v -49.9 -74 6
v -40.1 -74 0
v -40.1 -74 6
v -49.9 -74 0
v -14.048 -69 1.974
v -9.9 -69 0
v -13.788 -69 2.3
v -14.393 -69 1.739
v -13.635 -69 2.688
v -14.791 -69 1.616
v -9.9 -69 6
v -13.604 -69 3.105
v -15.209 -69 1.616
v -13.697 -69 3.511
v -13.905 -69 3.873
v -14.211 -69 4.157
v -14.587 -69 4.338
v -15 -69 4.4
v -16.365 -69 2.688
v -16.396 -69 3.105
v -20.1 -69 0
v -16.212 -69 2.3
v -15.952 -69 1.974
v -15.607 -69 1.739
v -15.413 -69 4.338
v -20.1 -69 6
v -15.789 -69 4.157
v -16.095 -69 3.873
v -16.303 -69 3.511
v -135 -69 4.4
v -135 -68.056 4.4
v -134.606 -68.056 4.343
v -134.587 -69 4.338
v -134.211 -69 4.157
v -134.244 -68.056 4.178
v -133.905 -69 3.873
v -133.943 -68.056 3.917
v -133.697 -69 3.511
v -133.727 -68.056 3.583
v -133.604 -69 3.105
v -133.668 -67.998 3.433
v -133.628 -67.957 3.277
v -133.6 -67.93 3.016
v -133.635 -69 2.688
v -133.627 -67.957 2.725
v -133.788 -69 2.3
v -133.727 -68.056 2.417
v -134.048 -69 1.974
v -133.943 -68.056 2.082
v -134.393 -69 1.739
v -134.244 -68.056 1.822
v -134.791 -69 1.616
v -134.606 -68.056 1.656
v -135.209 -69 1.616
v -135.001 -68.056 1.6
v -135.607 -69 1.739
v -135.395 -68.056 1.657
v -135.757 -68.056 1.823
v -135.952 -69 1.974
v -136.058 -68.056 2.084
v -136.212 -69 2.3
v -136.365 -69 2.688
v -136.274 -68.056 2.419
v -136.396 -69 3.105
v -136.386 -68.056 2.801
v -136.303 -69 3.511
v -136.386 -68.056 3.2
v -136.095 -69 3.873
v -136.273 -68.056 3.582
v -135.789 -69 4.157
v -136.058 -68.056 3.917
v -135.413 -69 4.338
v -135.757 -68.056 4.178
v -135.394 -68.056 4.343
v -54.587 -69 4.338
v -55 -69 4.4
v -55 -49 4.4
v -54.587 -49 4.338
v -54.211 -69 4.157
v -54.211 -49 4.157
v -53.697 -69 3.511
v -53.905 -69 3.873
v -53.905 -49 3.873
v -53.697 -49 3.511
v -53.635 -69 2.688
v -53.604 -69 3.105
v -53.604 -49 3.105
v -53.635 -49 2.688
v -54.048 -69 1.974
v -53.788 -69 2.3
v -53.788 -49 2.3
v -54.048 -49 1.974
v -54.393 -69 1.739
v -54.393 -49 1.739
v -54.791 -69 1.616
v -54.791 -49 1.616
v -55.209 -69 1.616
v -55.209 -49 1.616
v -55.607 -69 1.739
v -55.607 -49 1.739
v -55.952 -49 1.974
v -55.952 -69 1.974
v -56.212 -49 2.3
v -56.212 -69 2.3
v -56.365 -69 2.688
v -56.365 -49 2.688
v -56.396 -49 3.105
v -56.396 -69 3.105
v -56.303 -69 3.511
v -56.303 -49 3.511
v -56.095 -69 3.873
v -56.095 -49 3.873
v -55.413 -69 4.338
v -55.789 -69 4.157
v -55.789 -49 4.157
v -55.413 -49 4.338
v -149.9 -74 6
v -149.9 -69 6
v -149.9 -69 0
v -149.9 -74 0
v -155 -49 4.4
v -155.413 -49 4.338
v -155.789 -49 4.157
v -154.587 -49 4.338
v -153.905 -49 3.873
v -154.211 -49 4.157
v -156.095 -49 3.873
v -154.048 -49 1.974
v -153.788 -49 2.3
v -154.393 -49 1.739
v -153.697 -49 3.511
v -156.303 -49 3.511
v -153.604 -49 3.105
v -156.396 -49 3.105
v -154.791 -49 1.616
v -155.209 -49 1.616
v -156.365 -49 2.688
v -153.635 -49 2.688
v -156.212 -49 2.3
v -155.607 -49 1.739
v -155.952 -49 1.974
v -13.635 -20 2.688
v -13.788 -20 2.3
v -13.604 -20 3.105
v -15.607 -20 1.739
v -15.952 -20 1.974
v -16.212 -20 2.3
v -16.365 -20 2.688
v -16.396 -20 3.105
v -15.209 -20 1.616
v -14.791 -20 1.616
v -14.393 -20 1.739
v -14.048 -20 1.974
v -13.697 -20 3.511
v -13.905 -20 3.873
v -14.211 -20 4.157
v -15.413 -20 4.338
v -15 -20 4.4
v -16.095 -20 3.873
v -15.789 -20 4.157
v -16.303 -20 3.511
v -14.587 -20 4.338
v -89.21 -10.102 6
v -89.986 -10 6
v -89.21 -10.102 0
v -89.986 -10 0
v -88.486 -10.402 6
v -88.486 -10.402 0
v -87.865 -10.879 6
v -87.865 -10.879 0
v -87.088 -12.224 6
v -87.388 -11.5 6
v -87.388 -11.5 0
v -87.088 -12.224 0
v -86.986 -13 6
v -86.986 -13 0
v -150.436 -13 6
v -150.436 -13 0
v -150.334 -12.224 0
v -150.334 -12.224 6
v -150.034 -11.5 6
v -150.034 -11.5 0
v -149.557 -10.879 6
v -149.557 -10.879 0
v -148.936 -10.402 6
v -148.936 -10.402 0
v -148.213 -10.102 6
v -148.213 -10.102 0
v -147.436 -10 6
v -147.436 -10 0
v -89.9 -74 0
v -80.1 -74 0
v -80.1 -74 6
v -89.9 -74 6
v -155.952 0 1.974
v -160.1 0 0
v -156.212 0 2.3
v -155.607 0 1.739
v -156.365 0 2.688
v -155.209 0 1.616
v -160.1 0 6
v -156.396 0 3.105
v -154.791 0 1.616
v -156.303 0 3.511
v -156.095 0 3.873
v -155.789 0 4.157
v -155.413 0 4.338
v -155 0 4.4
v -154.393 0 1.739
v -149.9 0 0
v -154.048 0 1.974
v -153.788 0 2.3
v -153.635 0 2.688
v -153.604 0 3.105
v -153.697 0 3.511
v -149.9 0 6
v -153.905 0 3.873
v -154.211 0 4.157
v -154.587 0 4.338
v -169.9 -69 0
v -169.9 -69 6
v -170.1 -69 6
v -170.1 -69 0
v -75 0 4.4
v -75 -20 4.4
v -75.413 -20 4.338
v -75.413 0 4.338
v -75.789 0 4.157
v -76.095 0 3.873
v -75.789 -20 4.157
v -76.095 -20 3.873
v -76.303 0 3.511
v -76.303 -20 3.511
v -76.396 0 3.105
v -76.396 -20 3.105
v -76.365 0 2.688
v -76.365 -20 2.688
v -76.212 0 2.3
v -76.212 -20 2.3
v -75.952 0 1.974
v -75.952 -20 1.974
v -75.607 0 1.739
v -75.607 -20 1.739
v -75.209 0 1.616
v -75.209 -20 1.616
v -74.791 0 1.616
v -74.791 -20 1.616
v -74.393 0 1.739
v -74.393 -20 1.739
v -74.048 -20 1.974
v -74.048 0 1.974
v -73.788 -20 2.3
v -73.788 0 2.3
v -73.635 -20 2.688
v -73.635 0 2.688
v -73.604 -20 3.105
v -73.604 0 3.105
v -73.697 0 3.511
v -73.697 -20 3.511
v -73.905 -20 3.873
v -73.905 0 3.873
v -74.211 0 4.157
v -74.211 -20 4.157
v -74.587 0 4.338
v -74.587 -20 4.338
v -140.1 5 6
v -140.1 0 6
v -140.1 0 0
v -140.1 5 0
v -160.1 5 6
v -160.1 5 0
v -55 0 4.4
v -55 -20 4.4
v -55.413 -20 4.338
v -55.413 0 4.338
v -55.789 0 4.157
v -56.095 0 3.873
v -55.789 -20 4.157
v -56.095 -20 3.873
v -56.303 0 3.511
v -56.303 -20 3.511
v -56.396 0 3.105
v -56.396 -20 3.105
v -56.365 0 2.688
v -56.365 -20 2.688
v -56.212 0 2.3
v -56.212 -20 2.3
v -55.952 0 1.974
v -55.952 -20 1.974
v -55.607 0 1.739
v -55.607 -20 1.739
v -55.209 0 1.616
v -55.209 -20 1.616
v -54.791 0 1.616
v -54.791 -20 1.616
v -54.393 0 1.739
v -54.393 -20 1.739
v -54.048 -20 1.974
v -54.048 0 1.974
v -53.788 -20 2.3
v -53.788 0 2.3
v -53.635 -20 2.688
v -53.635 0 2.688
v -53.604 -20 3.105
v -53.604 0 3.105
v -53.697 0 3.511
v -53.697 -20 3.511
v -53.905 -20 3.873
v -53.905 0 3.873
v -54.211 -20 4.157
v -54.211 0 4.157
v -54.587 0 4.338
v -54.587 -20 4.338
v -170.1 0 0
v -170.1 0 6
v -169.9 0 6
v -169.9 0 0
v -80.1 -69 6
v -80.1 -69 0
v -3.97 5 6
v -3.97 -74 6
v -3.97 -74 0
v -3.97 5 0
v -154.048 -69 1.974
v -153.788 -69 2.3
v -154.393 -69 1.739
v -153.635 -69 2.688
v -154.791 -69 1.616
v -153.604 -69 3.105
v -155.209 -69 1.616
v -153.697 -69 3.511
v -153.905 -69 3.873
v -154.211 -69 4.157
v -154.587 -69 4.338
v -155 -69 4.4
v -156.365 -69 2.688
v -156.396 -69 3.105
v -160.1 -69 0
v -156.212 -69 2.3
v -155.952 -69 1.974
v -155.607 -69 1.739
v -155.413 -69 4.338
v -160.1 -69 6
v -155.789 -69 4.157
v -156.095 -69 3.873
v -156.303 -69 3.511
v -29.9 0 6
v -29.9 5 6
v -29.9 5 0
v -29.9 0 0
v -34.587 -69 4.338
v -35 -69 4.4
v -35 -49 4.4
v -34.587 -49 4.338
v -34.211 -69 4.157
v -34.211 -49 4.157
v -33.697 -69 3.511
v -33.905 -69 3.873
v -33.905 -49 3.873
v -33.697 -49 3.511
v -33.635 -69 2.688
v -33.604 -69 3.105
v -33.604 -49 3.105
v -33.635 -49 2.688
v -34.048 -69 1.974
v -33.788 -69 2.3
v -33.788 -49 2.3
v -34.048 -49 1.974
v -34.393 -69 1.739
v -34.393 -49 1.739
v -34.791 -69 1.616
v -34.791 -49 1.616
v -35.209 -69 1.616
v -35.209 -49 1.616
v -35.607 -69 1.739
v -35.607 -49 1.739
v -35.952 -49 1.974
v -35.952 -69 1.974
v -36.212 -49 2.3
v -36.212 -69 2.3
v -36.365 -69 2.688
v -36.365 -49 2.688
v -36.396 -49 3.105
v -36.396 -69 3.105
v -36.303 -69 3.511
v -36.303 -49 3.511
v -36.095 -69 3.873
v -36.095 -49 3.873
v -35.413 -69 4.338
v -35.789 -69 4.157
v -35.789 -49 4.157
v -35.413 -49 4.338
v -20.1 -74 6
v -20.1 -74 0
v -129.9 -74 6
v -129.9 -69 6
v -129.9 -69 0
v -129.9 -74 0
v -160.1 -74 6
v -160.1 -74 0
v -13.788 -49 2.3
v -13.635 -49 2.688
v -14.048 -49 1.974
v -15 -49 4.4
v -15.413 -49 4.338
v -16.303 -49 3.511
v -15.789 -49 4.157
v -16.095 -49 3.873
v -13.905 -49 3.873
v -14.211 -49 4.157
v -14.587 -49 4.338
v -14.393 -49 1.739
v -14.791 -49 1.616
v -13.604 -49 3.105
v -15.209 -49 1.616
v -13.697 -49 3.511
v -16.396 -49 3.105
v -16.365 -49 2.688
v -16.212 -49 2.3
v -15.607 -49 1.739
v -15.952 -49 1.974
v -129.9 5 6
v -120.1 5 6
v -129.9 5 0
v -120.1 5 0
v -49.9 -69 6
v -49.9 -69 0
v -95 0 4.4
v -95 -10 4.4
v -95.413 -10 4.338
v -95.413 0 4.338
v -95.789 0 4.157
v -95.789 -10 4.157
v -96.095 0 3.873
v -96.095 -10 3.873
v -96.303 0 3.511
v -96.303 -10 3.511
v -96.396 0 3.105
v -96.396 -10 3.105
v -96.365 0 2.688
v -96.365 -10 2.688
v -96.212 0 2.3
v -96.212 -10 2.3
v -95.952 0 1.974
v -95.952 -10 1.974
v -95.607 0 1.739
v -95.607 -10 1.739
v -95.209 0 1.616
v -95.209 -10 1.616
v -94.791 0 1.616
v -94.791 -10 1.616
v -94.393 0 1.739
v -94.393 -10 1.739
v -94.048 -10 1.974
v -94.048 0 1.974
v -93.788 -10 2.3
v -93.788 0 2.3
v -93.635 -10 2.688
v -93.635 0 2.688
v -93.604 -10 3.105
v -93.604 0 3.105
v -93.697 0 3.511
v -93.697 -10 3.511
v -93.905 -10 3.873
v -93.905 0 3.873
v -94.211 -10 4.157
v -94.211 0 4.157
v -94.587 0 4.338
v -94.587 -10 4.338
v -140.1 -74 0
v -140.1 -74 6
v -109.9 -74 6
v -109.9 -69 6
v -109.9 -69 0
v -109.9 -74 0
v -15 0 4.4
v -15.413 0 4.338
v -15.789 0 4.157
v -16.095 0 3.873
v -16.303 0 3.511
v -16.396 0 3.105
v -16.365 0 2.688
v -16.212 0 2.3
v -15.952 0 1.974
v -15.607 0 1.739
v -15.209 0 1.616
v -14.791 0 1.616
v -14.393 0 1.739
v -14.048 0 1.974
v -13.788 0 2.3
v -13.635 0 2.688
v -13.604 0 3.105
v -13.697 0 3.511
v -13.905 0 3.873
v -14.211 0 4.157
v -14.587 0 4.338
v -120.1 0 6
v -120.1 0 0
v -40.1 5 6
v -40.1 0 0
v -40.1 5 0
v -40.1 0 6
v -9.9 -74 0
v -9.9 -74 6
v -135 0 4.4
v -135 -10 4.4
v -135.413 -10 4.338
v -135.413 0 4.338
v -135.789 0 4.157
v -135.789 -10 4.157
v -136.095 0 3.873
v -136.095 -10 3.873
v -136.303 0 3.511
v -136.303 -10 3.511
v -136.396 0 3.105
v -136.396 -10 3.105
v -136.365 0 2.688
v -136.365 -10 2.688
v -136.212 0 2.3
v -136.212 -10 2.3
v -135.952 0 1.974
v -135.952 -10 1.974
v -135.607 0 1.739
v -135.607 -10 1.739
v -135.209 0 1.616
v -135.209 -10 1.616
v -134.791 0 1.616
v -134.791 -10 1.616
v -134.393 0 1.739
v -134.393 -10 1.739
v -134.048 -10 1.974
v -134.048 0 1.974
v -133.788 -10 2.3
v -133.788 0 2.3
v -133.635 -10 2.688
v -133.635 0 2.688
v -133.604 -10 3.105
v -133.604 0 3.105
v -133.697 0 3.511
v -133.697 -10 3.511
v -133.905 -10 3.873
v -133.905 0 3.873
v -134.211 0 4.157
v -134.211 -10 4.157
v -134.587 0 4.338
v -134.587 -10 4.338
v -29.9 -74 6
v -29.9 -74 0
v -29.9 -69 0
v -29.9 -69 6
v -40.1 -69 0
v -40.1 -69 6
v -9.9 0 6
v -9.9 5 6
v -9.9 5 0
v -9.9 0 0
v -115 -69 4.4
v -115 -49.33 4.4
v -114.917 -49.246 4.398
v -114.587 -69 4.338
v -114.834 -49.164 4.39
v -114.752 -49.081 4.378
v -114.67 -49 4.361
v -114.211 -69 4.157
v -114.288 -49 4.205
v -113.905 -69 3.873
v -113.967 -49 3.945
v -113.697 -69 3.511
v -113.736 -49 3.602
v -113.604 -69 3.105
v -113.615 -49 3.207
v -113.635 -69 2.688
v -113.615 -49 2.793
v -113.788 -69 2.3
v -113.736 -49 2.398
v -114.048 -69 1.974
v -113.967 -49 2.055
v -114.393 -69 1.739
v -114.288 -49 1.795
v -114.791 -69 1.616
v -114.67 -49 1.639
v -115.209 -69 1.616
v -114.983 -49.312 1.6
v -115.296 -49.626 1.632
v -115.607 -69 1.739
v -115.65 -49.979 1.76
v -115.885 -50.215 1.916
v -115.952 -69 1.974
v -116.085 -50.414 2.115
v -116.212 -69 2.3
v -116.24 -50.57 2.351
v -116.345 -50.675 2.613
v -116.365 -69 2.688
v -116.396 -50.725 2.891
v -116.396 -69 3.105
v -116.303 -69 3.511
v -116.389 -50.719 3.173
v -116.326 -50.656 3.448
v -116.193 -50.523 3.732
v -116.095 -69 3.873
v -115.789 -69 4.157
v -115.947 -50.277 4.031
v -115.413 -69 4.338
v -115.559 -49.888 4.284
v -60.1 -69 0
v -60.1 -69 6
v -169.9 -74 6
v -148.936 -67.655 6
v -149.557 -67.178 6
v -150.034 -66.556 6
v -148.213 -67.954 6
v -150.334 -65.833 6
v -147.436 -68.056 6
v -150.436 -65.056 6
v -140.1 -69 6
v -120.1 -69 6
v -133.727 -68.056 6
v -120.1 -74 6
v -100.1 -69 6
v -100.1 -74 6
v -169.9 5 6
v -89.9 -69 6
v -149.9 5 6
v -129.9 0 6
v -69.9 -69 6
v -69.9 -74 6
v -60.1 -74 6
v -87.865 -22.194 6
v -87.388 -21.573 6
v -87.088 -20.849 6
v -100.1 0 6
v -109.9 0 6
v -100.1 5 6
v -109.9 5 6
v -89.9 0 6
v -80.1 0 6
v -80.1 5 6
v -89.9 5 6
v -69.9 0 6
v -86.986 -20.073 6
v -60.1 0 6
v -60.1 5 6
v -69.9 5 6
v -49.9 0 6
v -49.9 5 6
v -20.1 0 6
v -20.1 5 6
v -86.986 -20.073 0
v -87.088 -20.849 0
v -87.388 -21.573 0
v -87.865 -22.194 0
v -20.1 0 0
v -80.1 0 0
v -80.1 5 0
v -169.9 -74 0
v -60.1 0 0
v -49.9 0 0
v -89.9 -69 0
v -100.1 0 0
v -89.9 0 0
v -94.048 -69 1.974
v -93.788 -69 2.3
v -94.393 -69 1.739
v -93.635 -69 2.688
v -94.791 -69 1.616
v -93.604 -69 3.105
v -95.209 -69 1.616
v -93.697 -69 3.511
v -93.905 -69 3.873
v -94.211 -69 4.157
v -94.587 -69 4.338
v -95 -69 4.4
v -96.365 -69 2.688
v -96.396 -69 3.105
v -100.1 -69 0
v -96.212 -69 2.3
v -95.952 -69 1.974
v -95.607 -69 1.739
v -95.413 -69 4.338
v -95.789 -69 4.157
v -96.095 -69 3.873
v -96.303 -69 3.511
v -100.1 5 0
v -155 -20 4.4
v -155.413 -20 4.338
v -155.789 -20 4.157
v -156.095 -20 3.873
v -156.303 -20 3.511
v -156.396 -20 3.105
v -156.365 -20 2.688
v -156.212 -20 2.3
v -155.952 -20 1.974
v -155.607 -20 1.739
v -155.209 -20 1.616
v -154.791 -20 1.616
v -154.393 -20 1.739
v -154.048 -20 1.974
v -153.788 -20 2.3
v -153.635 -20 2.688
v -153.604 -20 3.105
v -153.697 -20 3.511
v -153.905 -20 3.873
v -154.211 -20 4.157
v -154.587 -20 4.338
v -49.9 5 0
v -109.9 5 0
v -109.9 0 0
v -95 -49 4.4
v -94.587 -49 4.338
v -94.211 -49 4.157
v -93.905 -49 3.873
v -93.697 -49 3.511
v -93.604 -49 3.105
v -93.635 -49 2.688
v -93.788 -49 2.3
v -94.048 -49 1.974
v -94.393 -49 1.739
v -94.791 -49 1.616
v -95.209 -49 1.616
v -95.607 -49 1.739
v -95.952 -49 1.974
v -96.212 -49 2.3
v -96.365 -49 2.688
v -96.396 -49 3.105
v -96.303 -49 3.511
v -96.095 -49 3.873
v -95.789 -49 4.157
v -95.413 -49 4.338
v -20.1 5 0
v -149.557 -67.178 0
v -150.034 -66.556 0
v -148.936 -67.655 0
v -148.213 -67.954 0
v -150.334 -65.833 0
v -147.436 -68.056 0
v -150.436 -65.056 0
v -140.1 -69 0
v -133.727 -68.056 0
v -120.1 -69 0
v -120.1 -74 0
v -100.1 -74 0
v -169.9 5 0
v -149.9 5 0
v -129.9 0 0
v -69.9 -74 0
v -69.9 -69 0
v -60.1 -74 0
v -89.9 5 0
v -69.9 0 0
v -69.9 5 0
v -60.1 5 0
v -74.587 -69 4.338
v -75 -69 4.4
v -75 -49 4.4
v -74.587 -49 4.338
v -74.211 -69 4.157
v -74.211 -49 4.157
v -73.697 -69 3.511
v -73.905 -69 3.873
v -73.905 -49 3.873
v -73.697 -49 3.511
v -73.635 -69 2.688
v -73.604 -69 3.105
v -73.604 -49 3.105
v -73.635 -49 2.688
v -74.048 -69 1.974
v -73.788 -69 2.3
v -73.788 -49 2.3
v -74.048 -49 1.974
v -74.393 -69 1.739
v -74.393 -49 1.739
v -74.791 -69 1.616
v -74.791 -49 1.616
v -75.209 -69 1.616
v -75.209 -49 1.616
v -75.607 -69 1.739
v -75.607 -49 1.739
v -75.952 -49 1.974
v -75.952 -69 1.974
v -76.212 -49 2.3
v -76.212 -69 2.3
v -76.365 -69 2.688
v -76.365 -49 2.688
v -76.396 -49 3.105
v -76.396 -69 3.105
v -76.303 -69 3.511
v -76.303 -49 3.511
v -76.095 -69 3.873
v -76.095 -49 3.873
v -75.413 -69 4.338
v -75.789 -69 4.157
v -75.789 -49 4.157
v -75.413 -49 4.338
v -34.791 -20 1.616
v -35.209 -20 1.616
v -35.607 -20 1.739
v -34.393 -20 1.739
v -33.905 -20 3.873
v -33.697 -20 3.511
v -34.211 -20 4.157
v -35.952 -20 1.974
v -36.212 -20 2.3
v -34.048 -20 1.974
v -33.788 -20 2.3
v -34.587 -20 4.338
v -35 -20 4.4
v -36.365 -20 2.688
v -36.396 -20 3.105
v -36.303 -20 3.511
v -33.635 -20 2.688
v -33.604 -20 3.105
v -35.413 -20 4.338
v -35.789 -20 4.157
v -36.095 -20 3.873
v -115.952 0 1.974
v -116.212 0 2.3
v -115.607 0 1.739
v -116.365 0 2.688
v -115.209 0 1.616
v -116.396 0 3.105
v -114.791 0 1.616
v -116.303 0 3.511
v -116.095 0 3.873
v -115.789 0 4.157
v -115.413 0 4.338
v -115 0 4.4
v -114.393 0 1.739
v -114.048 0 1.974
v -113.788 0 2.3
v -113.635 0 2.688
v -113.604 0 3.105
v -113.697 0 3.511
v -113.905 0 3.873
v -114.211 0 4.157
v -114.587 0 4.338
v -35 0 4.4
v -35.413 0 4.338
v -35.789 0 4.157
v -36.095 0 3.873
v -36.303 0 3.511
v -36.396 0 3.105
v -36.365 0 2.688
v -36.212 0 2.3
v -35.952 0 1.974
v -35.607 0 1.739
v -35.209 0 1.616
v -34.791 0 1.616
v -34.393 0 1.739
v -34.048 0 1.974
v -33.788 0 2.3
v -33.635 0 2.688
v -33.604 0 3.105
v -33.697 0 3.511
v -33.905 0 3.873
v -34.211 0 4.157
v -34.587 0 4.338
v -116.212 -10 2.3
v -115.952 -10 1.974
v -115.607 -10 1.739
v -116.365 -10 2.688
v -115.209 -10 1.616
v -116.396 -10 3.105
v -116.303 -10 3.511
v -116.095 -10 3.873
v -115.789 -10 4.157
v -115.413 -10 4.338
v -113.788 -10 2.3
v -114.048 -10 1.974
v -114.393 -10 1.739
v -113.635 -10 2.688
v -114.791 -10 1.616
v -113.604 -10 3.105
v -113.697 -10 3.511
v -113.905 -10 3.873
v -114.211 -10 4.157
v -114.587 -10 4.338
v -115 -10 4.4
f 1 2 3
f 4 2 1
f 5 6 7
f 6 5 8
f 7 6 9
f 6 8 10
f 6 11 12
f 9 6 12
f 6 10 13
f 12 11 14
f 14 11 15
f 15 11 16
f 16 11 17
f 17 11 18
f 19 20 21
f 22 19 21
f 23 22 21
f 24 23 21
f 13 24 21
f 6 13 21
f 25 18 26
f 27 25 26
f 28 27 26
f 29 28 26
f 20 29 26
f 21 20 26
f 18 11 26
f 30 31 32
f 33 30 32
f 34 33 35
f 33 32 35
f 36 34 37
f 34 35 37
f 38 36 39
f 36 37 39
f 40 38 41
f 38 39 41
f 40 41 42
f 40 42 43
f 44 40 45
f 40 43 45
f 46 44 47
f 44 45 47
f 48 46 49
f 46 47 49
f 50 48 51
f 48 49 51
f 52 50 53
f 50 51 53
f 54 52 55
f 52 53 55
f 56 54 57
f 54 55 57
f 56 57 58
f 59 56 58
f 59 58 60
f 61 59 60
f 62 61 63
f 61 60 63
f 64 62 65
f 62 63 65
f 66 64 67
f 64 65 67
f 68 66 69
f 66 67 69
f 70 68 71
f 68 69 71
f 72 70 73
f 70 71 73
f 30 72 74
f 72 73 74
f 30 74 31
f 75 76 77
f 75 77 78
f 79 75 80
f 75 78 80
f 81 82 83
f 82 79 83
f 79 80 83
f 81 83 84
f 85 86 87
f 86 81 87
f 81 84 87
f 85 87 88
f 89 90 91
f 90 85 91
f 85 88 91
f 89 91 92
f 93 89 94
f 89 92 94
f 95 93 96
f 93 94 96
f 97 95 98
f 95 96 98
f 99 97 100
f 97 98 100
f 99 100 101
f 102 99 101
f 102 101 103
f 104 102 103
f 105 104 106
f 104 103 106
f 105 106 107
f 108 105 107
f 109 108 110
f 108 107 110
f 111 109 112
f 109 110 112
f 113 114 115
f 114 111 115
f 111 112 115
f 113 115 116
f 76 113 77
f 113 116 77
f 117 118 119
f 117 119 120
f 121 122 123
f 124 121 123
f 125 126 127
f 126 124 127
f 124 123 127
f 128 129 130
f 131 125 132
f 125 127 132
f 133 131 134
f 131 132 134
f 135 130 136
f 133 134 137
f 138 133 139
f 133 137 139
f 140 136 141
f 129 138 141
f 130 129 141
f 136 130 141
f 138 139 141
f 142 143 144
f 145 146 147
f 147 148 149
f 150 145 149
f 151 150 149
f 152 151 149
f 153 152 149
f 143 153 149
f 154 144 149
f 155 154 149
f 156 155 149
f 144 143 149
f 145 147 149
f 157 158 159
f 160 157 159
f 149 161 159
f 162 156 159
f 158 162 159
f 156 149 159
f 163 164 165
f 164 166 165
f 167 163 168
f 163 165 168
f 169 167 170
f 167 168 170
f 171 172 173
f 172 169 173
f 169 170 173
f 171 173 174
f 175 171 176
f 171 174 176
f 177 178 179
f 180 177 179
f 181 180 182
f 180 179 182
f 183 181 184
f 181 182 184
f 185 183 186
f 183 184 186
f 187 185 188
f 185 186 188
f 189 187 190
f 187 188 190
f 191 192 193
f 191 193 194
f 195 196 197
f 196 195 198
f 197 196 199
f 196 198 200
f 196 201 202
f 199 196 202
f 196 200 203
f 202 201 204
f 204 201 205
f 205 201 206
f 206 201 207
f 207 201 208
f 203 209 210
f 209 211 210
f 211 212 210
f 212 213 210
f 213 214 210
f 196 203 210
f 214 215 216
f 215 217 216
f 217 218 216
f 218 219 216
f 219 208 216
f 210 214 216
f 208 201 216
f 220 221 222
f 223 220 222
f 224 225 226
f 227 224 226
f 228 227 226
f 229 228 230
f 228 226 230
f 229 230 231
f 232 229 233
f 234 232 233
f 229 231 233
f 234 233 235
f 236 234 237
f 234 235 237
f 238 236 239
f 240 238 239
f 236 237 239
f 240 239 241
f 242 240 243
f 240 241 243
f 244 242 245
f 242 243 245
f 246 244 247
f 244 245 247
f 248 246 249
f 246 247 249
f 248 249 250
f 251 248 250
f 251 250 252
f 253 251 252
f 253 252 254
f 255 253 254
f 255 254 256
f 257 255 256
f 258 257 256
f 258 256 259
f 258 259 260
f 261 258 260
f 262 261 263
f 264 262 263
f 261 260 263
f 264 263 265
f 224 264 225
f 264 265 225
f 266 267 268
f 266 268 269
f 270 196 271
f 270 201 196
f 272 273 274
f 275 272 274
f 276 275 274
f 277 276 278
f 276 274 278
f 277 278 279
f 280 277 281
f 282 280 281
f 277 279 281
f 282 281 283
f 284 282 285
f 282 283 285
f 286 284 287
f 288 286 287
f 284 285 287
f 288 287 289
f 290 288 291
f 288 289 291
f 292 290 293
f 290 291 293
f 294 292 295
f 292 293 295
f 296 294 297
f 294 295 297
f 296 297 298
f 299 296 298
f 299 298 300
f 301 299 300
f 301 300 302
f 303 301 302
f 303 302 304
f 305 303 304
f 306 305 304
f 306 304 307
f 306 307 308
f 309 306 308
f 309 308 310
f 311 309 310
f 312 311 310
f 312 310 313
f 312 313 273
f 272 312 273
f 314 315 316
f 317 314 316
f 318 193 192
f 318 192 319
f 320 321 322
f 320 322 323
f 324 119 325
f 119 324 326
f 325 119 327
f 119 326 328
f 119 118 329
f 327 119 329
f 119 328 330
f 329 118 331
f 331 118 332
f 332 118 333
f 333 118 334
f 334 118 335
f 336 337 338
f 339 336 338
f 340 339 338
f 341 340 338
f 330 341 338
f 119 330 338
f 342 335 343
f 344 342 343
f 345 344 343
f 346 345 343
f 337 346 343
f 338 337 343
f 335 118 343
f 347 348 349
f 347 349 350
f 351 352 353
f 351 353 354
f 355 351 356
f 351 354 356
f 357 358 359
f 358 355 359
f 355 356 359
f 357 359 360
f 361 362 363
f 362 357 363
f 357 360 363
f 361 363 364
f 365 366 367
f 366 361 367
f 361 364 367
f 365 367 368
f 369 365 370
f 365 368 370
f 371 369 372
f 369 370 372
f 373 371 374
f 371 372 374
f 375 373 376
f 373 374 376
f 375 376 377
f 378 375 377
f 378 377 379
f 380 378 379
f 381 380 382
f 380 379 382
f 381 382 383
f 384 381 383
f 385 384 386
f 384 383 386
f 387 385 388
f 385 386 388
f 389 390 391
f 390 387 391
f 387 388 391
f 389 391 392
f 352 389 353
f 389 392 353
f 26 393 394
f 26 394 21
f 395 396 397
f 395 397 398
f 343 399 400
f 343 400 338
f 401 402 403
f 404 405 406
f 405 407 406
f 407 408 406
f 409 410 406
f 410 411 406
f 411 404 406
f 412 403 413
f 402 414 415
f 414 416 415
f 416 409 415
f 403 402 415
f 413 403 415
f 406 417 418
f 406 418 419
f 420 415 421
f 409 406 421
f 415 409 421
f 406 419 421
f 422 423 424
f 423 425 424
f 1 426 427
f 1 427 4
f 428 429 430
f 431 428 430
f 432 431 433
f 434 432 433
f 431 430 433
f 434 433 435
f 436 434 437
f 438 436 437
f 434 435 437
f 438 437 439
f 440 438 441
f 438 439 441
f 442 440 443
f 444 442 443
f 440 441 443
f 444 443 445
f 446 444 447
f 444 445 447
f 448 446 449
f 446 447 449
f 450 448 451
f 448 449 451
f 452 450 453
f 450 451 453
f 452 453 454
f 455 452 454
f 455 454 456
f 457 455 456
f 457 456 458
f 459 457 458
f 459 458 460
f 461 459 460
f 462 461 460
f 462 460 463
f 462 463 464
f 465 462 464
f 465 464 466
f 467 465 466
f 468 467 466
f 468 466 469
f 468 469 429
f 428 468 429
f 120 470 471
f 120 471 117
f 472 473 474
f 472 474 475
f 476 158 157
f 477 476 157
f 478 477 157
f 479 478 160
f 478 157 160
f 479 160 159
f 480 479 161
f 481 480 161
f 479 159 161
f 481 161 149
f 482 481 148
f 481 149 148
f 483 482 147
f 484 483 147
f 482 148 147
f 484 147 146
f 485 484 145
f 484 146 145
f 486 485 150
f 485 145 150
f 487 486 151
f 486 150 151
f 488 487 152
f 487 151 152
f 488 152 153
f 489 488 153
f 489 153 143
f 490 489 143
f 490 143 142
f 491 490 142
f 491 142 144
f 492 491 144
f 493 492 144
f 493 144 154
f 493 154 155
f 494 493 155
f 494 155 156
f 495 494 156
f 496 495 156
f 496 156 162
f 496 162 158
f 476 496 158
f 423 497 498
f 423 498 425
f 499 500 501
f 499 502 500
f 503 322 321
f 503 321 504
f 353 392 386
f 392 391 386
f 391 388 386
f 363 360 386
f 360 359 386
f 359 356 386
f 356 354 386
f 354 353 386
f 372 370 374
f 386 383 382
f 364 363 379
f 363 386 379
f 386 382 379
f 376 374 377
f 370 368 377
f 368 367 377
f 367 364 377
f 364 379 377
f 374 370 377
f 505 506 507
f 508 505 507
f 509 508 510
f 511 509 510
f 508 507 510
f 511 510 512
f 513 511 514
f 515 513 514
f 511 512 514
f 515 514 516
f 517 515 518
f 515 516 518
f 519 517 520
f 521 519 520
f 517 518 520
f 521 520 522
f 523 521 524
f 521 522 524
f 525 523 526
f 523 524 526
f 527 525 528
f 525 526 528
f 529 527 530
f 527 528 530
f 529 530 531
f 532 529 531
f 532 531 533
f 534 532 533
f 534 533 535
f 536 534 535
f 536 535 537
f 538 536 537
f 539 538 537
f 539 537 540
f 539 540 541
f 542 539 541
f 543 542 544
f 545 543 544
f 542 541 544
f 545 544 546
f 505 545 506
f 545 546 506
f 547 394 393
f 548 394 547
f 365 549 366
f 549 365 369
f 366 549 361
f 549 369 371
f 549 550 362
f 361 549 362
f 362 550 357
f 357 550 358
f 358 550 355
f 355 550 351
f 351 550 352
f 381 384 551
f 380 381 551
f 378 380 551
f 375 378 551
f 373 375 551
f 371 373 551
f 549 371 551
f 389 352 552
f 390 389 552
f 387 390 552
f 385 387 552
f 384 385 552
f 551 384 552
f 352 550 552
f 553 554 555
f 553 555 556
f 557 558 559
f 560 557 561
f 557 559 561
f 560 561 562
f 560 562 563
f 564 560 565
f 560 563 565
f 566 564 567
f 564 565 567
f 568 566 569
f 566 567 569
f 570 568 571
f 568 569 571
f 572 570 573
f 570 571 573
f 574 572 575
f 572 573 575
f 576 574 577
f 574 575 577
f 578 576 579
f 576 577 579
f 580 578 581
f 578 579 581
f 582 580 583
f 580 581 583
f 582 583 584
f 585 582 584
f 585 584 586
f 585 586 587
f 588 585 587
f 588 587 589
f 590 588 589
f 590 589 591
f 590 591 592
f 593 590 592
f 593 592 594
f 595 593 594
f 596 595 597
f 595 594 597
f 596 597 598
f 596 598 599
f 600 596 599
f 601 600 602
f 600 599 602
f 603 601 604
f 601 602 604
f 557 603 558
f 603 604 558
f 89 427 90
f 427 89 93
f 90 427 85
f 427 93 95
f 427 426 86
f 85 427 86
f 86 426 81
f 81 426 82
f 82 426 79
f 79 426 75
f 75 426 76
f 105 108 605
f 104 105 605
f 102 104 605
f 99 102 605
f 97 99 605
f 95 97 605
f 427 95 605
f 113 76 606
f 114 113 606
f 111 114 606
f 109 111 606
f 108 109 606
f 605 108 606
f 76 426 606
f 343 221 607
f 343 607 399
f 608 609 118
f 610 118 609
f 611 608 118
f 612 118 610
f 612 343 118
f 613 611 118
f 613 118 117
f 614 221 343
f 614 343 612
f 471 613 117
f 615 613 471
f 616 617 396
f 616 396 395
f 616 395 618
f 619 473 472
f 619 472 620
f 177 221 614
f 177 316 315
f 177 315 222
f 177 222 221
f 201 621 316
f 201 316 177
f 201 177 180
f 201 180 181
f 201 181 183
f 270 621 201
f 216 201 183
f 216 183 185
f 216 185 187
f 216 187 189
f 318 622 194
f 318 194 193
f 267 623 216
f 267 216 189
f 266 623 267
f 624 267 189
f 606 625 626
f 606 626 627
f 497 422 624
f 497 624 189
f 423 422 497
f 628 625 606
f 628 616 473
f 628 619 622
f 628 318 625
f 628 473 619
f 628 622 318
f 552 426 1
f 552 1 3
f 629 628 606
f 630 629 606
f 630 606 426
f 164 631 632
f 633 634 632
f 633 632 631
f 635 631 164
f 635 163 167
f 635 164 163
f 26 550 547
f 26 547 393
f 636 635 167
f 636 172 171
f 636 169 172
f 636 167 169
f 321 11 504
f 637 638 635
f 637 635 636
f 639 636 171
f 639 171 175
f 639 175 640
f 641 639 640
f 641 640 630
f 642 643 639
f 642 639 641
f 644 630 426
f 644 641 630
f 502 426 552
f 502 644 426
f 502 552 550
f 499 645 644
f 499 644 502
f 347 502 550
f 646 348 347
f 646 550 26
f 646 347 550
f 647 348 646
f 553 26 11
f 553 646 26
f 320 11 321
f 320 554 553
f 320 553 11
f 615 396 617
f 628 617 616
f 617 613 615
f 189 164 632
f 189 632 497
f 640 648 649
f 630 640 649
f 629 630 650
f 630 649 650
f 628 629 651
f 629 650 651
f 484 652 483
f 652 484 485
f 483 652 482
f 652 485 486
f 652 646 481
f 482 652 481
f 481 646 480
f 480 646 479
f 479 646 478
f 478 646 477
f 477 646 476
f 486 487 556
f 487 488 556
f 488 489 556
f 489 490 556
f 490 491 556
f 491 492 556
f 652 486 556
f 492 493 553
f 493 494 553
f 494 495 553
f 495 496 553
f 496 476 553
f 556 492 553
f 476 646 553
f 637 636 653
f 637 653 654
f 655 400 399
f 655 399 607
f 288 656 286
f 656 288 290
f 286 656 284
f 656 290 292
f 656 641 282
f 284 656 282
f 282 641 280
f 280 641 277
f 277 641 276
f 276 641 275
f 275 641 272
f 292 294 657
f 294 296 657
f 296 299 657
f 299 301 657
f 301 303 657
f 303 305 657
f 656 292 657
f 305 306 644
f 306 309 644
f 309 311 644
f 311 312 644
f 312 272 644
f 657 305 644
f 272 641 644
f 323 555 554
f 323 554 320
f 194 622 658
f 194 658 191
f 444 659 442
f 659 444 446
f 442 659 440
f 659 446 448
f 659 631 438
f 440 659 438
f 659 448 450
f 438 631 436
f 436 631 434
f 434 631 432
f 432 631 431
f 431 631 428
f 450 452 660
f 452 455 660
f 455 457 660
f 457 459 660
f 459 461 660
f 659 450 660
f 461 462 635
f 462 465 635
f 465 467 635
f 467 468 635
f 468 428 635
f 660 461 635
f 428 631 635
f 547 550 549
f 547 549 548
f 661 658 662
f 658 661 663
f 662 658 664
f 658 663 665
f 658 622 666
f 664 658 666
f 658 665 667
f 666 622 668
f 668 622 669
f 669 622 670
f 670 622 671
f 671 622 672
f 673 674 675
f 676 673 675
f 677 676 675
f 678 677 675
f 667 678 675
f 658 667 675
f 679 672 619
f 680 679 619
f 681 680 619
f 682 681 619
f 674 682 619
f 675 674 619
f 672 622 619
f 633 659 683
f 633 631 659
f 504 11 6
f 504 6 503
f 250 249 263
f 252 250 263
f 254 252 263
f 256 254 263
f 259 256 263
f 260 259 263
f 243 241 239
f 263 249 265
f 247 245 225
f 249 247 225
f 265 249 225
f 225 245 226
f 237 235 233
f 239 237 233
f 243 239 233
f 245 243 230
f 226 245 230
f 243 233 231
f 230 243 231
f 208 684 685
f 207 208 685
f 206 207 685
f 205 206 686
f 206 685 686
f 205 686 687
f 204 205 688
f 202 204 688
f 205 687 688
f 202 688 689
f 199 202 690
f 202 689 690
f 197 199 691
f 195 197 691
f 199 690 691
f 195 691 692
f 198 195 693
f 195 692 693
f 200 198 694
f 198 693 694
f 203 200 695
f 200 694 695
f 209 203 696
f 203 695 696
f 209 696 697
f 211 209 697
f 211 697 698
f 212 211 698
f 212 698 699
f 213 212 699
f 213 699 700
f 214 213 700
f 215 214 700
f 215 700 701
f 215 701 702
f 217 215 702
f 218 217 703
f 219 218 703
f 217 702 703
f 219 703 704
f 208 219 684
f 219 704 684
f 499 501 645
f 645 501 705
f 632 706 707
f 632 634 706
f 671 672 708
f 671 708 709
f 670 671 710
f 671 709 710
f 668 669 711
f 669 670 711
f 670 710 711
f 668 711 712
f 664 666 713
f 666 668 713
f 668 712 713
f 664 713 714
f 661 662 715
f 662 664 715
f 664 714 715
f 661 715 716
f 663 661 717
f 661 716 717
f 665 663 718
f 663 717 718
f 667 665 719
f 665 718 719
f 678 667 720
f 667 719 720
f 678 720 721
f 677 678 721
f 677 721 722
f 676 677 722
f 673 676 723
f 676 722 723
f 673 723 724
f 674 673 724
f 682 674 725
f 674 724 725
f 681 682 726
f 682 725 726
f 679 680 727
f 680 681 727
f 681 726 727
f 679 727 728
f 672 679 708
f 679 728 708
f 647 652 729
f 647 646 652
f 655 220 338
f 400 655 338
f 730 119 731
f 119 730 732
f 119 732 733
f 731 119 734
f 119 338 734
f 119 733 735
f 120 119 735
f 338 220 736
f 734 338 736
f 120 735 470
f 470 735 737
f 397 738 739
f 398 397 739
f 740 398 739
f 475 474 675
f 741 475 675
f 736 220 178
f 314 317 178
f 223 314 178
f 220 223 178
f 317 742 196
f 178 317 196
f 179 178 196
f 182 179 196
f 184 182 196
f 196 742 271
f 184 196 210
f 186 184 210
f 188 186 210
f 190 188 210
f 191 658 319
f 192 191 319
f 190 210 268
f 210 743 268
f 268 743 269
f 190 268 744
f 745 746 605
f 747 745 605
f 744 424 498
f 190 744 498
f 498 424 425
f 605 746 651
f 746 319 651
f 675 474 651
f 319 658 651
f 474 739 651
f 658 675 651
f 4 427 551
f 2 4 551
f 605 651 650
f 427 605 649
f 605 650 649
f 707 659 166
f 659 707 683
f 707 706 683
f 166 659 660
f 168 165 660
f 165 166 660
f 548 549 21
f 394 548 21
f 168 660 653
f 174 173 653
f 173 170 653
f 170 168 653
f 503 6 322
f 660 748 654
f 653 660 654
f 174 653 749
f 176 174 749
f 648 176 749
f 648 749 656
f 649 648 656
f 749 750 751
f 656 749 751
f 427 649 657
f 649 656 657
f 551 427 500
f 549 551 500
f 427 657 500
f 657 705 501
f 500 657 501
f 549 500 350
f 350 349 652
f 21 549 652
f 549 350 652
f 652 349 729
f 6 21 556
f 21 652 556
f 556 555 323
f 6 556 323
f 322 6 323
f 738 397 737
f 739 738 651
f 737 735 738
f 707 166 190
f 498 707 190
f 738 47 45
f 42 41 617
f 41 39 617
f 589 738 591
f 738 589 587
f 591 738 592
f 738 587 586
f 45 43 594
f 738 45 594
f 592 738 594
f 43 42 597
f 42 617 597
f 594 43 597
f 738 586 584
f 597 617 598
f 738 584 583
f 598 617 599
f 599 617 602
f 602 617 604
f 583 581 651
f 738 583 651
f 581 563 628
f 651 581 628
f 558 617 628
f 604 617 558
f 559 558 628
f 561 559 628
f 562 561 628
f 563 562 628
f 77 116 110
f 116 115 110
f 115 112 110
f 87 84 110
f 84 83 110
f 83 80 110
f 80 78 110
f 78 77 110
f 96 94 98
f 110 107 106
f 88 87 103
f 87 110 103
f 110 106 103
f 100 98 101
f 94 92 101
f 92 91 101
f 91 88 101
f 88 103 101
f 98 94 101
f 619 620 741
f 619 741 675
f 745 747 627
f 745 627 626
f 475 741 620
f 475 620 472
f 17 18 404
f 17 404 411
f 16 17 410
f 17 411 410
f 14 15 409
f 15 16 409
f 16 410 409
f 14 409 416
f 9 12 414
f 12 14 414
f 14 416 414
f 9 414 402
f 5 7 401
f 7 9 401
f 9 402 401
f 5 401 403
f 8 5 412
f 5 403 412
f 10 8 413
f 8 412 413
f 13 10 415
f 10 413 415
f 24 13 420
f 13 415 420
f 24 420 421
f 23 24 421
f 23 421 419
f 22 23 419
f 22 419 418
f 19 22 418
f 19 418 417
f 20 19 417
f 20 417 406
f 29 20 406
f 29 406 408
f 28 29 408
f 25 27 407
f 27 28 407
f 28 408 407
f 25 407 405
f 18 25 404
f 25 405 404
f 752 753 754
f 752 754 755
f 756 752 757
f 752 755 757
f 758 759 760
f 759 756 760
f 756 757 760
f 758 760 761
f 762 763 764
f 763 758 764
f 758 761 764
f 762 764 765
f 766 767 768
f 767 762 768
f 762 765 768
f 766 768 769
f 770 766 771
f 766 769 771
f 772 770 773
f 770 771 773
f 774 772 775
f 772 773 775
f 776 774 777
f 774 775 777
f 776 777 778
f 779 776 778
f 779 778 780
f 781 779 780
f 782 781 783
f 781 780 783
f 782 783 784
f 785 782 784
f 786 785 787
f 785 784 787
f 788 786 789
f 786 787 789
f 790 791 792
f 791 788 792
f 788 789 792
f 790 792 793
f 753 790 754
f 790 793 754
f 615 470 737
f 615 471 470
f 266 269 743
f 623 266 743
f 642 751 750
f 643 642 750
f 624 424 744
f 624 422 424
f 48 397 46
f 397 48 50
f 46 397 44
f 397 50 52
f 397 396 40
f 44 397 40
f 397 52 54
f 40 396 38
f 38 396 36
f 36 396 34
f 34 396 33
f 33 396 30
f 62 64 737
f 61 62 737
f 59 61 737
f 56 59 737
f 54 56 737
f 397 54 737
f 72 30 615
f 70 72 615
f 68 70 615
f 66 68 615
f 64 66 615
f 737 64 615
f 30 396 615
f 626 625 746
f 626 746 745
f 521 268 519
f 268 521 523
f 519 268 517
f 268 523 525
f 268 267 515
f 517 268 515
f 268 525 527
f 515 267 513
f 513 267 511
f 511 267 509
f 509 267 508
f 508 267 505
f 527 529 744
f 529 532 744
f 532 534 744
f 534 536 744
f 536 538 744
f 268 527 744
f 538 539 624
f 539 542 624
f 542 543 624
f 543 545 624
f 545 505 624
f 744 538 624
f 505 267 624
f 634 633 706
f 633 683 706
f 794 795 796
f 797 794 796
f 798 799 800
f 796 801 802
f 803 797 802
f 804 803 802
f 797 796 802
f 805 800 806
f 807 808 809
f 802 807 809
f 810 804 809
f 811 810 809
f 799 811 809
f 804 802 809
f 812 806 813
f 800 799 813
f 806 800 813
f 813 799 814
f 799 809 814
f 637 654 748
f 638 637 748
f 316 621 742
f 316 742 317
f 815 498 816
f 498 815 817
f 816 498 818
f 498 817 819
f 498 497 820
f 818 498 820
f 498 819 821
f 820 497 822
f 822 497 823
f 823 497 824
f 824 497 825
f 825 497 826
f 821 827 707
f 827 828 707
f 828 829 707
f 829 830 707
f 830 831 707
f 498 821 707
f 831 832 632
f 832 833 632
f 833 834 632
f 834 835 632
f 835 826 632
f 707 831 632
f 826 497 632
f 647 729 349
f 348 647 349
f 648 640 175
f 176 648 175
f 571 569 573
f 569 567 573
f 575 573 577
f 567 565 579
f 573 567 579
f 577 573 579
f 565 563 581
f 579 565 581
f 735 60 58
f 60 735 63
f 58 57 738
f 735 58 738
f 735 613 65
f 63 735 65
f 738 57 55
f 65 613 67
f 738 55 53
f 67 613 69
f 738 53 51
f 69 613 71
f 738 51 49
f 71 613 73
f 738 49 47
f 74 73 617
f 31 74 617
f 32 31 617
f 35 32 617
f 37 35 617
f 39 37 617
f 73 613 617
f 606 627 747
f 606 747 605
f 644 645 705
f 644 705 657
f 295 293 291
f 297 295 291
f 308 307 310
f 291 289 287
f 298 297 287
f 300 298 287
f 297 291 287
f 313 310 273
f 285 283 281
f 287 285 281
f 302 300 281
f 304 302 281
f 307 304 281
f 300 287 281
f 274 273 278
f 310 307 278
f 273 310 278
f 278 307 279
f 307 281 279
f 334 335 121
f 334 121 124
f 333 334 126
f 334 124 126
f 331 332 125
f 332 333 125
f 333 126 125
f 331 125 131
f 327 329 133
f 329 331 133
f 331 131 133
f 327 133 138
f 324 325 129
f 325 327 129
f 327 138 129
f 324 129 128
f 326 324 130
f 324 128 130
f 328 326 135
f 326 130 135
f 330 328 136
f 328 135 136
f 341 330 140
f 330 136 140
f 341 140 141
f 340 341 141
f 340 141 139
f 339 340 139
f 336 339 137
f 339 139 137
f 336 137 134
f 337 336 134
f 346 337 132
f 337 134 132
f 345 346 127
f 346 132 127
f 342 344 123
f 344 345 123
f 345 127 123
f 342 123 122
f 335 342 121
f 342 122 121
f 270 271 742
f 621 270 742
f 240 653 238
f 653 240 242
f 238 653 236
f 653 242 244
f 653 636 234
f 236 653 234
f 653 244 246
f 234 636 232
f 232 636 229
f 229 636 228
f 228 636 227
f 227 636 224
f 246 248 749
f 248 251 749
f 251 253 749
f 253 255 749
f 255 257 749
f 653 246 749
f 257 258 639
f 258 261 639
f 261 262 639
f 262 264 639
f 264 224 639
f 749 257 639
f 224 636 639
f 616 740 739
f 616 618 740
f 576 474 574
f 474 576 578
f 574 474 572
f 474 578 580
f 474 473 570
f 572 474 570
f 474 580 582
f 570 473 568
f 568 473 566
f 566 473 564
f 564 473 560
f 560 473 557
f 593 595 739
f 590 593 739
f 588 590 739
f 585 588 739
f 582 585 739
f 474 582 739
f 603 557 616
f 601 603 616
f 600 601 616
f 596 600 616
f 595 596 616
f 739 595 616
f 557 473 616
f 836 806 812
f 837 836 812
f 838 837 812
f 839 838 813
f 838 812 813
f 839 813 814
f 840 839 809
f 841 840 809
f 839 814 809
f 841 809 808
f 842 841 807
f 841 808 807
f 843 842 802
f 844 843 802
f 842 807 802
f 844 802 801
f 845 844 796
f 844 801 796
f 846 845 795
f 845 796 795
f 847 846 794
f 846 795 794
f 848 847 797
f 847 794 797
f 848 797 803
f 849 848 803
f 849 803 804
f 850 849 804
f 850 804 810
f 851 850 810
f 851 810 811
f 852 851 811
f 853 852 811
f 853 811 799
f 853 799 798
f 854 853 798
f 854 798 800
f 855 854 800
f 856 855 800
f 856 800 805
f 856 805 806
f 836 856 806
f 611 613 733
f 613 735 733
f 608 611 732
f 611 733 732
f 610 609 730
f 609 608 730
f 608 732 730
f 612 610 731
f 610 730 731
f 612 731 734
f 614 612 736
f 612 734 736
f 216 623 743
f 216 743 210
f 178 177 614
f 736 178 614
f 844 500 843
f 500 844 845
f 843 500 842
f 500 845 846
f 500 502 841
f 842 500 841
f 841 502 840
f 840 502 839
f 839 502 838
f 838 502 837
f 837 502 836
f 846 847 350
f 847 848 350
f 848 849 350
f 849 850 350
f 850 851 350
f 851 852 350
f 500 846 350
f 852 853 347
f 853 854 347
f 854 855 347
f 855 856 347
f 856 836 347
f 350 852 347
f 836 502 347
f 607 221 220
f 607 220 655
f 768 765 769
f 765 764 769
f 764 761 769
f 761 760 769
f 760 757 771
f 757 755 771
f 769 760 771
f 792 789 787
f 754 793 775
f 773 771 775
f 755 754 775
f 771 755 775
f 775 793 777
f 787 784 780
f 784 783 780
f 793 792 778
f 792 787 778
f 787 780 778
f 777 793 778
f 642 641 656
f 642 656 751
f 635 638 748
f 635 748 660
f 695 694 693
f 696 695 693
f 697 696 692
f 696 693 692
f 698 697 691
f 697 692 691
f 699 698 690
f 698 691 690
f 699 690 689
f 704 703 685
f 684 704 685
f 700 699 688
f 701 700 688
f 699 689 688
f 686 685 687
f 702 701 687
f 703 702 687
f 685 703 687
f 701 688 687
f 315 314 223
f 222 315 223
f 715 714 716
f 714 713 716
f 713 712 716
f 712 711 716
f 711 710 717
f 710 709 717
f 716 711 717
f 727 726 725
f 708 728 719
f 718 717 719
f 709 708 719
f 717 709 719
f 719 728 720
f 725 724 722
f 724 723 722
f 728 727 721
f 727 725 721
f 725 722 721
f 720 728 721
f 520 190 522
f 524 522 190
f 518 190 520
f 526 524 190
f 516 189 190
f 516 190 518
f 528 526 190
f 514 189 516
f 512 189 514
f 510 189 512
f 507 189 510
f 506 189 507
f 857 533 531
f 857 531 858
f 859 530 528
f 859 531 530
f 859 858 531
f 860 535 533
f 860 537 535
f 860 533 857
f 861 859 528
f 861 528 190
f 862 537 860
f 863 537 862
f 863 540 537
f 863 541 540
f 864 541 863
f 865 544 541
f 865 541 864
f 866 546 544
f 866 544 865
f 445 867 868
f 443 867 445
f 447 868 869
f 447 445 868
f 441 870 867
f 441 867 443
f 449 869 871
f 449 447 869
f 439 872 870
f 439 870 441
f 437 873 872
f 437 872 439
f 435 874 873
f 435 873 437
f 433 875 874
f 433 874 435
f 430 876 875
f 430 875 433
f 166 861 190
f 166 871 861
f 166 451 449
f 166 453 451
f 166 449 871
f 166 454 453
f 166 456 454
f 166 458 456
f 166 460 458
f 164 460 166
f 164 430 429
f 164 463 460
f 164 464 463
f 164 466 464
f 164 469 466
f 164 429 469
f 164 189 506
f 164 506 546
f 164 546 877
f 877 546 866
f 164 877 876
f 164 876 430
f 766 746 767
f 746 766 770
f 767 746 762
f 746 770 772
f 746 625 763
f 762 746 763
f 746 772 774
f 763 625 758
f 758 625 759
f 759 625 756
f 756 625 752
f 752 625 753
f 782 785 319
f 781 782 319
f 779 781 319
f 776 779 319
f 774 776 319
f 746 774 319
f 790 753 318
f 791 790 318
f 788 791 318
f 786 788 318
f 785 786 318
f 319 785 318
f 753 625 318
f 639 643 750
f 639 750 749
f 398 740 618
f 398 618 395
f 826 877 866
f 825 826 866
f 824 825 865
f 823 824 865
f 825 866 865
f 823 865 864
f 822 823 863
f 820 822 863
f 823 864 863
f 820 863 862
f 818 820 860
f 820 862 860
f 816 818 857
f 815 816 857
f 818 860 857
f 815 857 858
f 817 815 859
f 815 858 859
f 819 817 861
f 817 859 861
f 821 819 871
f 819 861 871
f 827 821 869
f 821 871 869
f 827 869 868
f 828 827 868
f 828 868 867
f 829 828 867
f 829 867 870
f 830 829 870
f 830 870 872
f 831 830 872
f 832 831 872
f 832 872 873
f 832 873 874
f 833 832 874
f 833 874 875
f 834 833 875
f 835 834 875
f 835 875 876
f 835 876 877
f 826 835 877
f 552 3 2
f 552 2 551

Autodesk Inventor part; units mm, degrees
ref_plane "YZ Plane" through (0, 0, 0) normal (1, 0, 0) x (0, 1, 0)
ref_plane "XZ Plane" through (0, 0, 0) normal (0, 1, 0) x (-1, 0, 0)
ref_plane "XY Plane" through (0, 0, 0) normal (0, 0, 1) x (1, 0, 0)
sketch "Sketch1" plane through (0, 0, 0) normal (0, 0, 1) x (1, 0, 0)
  line L0 (0, -120) -> (0, 155.2673) projected
  line L1 (-130, 0) -> (-130, 5) projected
  line L2 (-10, 5) -> (0, 5) projected
  line L3 (0, -74) -> (-9.8, -74) projected
  line L4 (-130, 5) -> (-120, 5) projected
  line L5 (-120.2, -74) -> (-129.8, -74) projected
  line L6 (-129.8, -69) -> (-129.8, -74) projected
  line L7 (0, 5) -> (-170.1, 5)
  line L8 (-170.1, 5) -> (-170.1, -74)
  line L9 (-170.1, -74) -> (0, -74)
  line L10 (0, -74) -> (0, 5)
  line L11 (-156.6357, -1) -> (-156.6357, 5) projected
  line L12 (-170.1, -1) -> (-170.1, 5) projected
  point P0 (0, 0)
  dimension "d27" = 0
extrude "Extrusion1" add sketch "Sketch1" along normal blind 6
sketch "Sketch2" plane through (0, 0, 6) normal (0, 0, 1) x (1, 0, 0)
  line L0 (-10, 0) -> (-10, 5) projected
  line L1 (0, 5) -> (-170.1, 5) projected
  line L2 (-20, 0) -> (-10, 0) projected
  line L3 (-20, 5) -> (-20, 0) projected
  line L4 (-9.9, 5) -> (-9.9, 0)
  line L5 (-20.1, 0) -> (-20.1, 5)
  line L6 (-10, 0) -> (-9.9, 0)
  line L7 (-20, 0) -> (-20.1, 0)
  point P0 (-130, 5)
extrude "Extrusion2" cut sketch "Sketch2" against normal blind 6
sketch "Sketch3" plane through (-20.1, 0, 6) normal (0, 1, 0) x (1, 0, 0)
  circle A0 centre (5.1, 3) radius 1.5 projected
  point P0 (20.1, 6)
hole "Hole1" at (-15, 0, 3) direction (0, -1, 0) diameter 2.8 depth 20
pattern_linear "Rectangular Pattern2" count 9 spacing 20 along (-1, 0, 0) of "Extrusion2", "Hole1"
ref_plane "Work Plane1" through (-170.1, -34.5, 0) normal (0, -1, 0) x (1, 0, 0)
mirror "Mirror1" about plane through (-170.1, -34.5, 0) normal (0, -1, 0) of "Extrusion2", "Hole1", "Rectangular Pattern2"
sketch "Skizze4" plane through (0, 0, 6) normal (0, 0, 1) x (1, 0, 0)
  line L0 (-3.4696, 5) -> (-3.4696, -74) projected
  line L1 (15.4076, -81.7963) -> (-3.9696, -81.7963)
  line L2 (-3.9696, -81.7963) -> (-3.9696, 13.3495)
  line L3 (-3.9696, 13.3495) -> (15.4076, 13.3495)
  line L4 (15.4076, 13.3495) -> (15.4076, -81.7963)
  point P0 (0, 0)
  dimension "d23" = 0.5
extrude "Extrusion3" cut sketch "Skizze4" against normal blind 10
sketch "Skizze5" plane through (0, 0, 6) normal (0, 0, 1) x (1, 0, 0)
  ellipse E0 centre (-101.986, -20.3375) end of major axis (-101.986, -27.7035) minor radius 7.2541 projected
  ellipse E1 centre (-140.4361, -58.0565) end of major axis (-140.4361, -65.4225) minor radius 7.2541 projected
  line L0 (-150.4361, -68.0565) -> (-91.986, -68.0565)
  line L1 (-86.986, -21.3155) -> (-86.986, -5)
  line L2 (-86.986, -5) -> (-150.4361, -5)
  line L3 (-150.4361, -5) -> (-150.4361, -68.0565)
  line L4 (-133.727, -68.0565) -> (-86.986, -21.3155)
  line L5 (-133.727, -68.0565) -> (-67.6252, -68.0565) construction
  line L6 (-86.986, -5) -> (-150.4361, -5)
  line L7 (-150.4361, -5) -> (-150.4361, -10)
  line L8 (-150.4361, -10) -> (-86.986, -10)
  line L9 (-86.986, -10) -> (-86.986, -5)
  point P0 (0, 0)
  dimension "d28" = 15
  dimension "d29" = 10
  dimension "d30" = 10
  dimension "d33" = 45
  dimension "d34" = 5
extrude "Extrusion4" cut sketch "Skizze5" against normal blind 10 contours E0 | E1 | L3 L8 L1 L4 L0
fillet "Rundung1" radius 3 4 edges at (-86.986, -10, 3) (-86.986, -21.3155, 3) (-150.4361, -68.0565, 3) (-150.4361, -10, 3)
properties part number "00_Baseplate_Simmo_side2"
